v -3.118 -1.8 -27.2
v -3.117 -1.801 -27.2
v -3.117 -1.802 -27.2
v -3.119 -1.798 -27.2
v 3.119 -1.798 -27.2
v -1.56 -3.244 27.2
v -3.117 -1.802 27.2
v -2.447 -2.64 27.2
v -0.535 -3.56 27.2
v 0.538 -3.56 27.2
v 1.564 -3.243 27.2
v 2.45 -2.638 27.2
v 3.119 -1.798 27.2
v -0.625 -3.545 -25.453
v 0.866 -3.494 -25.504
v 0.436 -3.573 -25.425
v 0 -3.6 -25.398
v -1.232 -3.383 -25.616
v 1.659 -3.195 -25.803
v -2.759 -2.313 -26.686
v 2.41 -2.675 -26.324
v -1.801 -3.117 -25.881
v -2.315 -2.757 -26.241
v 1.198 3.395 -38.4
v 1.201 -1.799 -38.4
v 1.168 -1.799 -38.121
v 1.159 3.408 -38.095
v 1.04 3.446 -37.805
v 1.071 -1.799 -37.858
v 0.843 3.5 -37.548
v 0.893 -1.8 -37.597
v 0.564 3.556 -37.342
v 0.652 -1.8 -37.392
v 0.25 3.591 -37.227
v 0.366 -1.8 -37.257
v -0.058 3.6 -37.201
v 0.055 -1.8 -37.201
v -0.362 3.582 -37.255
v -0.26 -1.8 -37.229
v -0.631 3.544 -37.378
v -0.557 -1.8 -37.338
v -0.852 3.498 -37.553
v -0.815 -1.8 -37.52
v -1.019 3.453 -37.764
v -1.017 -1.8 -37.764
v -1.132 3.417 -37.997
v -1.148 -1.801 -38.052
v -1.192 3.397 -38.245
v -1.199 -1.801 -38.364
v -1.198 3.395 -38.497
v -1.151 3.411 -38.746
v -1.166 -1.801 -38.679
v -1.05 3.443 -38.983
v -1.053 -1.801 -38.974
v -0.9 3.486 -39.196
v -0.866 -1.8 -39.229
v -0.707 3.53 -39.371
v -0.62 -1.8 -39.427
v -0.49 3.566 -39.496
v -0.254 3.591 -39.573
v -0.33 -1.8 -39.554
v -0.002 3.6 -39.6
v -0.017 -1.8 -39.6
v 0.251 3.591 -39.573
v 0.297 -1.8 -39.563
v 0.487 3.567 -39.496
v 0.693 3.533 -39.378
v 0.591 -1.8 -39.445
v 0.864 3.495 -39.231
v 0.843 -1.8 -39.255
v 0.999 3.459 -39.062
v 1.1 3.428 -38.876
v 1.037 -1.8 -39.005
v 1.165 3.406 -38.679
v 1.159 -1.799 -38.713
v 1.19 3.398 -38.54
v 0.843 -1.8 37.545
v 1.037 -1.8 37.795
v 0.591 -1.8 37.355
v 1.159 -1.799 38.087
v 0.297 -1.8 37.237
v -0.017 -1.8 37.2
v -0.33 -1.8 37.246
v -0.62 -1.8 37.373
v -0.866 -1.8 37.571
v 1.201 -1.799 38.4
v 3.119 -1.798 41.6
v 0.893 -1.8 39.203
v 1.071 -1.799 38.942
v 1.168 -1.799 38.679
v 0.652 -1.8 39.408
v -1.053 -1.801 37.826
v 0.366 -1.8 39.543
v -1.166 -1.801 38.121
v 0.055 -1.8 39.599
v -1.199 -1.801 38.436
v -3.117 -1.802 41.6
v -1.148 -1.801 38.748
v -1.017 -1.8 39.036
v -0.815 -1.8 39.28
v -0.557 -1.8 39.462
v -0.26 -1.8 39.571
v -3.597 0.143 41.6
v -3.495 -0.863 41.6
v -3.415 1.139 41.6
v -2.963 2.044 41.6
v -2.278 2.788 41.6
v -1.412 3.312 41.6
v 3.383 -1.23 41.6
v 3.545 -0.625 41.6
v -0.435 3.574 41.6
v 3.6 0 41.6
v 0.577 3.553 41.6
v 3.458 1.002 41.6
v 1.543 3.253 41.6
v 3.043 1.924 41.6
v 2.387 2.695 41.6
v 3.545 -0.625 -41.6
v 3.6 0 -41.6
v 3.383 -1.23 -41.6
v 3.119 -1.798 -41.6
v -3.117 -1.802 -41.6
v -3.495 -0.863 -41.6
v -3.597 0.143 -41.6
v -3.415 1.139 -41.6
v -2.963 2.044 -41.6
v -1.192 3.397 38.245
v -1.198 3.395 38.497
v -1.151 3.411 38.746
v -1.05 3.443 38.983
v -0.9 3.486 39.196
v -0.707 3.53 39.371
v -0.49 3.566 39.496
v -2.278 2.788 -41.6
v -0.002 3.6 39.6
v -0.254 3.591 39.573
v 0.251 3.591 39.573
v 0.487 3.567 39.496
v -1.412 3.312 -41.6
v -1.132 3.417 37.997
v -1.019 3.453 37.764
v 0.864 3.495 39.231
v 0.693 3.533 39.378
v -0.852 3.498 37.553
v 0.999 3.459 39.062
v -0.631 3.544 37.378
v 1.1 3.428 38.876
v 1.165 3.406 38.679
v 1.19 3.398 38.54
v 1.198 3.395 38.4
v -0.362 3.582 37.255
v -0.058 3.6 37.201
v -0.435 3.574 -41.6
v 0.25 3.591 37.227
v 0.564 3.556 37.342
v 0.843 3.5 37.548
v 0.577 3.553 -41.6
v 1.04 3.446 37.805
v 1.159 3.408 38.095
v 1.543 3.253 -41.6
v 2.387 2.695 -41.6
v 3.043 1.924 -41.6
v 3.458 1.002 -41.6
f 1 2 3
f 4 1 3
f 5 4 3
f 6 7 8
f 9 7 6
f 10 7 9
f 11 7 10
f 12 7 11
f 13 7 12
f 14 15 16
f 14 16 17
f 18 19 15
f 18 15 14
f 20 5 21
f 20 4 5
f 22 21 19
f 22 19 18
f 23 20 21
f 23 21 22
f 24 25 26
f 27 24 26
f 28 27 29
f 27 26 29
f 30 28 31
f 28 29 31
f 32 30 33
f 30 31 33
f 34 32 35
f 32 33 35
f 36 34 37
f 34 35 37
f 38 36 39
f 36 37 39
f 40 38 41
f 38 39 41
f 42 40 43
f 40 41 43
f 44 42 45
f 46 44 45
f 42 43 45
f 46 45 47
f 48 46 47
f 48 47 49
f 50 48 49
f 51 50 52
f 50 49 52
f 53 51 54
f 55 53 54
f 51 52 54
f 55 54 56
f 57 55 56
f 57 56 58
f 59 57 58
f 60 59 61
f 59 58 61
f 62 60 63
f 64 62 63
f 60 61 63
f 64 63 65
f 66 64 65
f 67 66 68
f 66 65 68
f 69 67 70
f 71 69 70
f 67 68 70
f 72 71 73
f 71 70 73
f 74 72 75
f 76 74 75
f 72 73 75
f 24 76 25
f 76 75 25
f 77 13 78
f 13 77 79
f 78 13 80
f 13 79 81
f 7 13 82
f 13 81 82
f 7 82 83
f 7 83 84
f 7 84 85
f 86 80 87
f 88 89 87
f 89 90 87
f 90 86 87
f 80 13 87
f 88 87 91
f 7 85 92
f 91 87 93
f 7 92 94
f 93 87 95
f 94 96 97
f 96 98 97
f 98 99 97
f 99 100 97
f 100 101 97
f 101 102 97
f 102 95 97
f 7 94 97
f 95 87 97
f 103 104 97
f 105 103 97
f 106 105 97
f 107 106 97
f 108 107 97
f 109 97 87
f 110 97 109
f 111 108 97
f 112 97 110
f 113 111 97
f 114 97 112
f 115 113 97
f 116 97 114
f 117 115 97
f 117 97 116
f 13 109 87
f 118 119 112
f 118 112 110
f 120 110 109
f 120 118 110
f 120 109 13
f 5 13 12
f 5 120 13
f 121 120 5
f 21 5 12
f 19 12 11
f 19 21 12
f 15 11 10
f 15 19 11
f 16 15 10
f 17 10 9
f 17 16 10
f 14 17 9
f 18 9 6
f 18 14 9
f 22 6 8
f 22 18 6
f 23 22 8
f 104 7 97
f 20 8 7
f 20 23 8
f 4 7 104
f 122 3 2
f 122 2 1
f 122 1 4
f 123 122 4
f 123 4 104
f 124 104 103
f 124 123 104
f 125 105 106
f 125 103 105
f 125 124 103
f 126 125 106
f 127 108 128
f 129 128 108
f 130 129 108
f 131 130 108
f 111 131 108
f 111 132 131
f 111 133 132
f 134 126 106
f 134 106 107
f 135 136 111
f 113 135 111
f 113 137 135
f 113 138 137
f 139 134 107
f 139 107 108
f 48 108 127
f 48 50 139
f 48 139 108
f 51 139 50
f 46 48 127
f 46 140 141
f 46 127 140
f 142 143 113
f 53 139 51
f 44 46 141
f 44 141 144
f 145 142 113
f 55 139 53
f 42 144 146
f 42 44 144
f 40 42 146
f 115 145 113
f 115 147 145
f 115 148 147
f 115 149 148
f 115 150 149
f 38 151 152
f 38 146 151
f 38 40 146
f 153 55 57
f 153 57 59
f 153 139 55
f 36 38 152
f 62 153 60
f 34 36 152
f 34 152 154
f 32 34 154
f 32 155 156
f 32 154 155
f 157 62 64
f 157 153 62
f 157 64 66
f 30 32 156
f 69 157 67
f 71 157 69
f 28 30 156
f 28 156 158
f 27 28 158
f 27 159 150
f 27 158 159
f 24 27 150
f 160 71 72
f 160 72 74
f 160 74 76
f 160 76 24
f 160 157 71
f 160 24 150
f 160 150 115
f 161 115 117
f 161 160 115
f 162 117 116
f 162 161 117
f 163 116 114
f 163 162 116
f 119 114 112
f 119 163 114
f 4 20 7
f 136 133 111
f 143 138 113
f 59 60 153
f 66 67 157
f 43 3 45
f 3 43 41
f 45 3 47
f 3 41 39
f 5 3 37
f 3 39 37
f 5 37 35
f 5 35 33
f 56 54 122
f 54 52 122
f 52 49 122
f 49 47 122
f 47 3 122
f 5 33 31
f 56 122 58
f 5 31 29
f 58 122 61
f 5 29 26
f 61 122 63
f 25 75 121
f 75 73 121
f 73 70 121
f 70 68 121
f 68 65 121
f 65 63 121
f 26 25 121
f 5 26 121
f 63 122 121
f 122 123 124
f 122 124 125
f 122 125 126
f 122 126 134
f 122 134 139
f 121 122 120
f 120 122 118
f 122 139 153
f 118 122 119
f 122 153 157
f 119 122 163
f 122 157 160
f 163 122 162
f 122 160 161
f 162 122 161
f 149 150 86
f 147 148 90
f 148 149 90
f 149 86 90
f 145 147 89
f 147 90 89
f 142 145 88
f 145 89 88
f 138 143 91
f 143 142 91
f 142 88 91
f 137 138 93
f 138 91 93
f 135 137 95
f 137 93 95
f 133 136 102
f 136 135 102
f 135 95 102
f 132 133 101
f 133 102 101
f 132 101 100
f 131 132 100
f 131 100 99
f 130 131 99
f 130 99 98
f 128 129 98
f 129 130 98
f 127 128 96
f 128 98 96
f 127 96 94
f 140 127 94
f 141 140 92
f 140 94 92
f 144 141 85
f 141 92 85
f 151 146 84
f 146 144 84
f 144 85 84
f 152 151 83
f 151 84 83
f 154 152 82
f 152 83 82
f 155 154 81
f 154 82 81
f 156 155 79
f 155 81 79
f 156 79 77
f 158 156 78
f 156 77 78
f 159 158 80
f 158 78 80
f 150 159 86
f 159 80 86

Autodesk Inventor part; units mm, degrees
ref_plane "YZ Plane" through (0, 0, 0) normal (1, 0, 0) x (0, 1, 0)
ref_plane "XZ Plane" through (0, 0, 0) normal (0, 1, 0) x (-1, 0, 0)
ref_plane "XY Plane" through (0, 0, 0) normal (0, 0, 1) x (1, 0, 0)
sketch "Sketch1" plane through (0, 0, 0) normal (0, 0, 1) x (1, 0, 0)
  circle A0 centre (0, 0) radius 3.6
  dimension "d0" = 7.2
extrude "Extrusion1" add sketch "Sketch1" along normal mid plane 83.2
sketch "Sketch2" plane through (0, 0, -41.6) normal (0, 0, -1) x (-1, 0, 0)
  circle A0 centre (0, 0) radius 3.6 projected
  circle A1 centre (0, 0) radius 3.6 projected
  line L0 (3.1168, -1.8015) -> (-3.1186, -1.7985)
  dimension "d3" = 1.8
extrude "Extrusion2" cut sketch "Sketch2" against normal blind 14.4 contours L0 A0 picked at (0.0258, -2.6154)
sketch "Sketch3" plane through (3.1186, -1.7985, -41.6) normal (0.0005, -1, 0) x (1, 0.0005, 0)
  line L0 (-3.1177, -16.64) -> (-3.1177, 99.84) projected
  circle A0 centre (-3.1177, 3.2) radius 1.2
  line L1 (0, 0) -> (-6.2354, 0) projected
  point P0 (-3.1177, 41.6)
  dimension "d6" = 2.4
  dimension "d7" = 3.2
extrude "Extrusion3" cut sketch "Sketch3" against normal blind 14.4
mirror "Mirror1" about plane through (0, 0, 0) normal (0, 0, 1) of "Extrusion3", "Extrusion2"
sketch "Sketch4" plane through (0, 0, 0) normal (1, 0, 0) x (0, 1, 0)
  line L0 (-3.6, -27.2) -> (-3.6, 27.2) projected
  line L1 (-1.7985, -27.2) -> (-3.6, -27.2) projected
  line L2 (-1.7985, -27.2) -> (-3.6, -25.3985)
  point P0 (0, 0)
  point P1 (-1.8015, -27.2)
  dimension "d10" = 45
extrude "Extrusion4" cut sketch "Sketch4" along normal mid plane 14.4
sketch "Sketch5" plane through (0, 0, -41.6) normal (0, 0, -1) x (-1, 0, 0)
  point P0 (0, 0)
sketch "Sketch6" plane through (0, 0, -41.6) normal (0, 0, -1) x (-1, 0, 0)
  line L0 (-3.1186, -1.7985) -> (3.1168, -1.8015) projected
  arc A0 (3.1168, -1.8015) -> (-3.1186, -1.7985) centre (0, 0) ccw projected
  line L1 (-3.1186, -1.7985) -> (3.1168, -1.8015) projected
  arc A1 (3.1168, -1.8015) -> (-3.1186, -1.7985) centre (0, 0) ccw projected
  line L2 (5.2617, -6.8026) -> (-5.2683, -6.7974)
  arc A2 (5.2617, -6.8026) -> (-5.2683, -6.7974) centre (0, 0) ccw
  dimension "d13" = 5
extrude "Extrusion5" [suppressed]
properties part number "Back axle"
